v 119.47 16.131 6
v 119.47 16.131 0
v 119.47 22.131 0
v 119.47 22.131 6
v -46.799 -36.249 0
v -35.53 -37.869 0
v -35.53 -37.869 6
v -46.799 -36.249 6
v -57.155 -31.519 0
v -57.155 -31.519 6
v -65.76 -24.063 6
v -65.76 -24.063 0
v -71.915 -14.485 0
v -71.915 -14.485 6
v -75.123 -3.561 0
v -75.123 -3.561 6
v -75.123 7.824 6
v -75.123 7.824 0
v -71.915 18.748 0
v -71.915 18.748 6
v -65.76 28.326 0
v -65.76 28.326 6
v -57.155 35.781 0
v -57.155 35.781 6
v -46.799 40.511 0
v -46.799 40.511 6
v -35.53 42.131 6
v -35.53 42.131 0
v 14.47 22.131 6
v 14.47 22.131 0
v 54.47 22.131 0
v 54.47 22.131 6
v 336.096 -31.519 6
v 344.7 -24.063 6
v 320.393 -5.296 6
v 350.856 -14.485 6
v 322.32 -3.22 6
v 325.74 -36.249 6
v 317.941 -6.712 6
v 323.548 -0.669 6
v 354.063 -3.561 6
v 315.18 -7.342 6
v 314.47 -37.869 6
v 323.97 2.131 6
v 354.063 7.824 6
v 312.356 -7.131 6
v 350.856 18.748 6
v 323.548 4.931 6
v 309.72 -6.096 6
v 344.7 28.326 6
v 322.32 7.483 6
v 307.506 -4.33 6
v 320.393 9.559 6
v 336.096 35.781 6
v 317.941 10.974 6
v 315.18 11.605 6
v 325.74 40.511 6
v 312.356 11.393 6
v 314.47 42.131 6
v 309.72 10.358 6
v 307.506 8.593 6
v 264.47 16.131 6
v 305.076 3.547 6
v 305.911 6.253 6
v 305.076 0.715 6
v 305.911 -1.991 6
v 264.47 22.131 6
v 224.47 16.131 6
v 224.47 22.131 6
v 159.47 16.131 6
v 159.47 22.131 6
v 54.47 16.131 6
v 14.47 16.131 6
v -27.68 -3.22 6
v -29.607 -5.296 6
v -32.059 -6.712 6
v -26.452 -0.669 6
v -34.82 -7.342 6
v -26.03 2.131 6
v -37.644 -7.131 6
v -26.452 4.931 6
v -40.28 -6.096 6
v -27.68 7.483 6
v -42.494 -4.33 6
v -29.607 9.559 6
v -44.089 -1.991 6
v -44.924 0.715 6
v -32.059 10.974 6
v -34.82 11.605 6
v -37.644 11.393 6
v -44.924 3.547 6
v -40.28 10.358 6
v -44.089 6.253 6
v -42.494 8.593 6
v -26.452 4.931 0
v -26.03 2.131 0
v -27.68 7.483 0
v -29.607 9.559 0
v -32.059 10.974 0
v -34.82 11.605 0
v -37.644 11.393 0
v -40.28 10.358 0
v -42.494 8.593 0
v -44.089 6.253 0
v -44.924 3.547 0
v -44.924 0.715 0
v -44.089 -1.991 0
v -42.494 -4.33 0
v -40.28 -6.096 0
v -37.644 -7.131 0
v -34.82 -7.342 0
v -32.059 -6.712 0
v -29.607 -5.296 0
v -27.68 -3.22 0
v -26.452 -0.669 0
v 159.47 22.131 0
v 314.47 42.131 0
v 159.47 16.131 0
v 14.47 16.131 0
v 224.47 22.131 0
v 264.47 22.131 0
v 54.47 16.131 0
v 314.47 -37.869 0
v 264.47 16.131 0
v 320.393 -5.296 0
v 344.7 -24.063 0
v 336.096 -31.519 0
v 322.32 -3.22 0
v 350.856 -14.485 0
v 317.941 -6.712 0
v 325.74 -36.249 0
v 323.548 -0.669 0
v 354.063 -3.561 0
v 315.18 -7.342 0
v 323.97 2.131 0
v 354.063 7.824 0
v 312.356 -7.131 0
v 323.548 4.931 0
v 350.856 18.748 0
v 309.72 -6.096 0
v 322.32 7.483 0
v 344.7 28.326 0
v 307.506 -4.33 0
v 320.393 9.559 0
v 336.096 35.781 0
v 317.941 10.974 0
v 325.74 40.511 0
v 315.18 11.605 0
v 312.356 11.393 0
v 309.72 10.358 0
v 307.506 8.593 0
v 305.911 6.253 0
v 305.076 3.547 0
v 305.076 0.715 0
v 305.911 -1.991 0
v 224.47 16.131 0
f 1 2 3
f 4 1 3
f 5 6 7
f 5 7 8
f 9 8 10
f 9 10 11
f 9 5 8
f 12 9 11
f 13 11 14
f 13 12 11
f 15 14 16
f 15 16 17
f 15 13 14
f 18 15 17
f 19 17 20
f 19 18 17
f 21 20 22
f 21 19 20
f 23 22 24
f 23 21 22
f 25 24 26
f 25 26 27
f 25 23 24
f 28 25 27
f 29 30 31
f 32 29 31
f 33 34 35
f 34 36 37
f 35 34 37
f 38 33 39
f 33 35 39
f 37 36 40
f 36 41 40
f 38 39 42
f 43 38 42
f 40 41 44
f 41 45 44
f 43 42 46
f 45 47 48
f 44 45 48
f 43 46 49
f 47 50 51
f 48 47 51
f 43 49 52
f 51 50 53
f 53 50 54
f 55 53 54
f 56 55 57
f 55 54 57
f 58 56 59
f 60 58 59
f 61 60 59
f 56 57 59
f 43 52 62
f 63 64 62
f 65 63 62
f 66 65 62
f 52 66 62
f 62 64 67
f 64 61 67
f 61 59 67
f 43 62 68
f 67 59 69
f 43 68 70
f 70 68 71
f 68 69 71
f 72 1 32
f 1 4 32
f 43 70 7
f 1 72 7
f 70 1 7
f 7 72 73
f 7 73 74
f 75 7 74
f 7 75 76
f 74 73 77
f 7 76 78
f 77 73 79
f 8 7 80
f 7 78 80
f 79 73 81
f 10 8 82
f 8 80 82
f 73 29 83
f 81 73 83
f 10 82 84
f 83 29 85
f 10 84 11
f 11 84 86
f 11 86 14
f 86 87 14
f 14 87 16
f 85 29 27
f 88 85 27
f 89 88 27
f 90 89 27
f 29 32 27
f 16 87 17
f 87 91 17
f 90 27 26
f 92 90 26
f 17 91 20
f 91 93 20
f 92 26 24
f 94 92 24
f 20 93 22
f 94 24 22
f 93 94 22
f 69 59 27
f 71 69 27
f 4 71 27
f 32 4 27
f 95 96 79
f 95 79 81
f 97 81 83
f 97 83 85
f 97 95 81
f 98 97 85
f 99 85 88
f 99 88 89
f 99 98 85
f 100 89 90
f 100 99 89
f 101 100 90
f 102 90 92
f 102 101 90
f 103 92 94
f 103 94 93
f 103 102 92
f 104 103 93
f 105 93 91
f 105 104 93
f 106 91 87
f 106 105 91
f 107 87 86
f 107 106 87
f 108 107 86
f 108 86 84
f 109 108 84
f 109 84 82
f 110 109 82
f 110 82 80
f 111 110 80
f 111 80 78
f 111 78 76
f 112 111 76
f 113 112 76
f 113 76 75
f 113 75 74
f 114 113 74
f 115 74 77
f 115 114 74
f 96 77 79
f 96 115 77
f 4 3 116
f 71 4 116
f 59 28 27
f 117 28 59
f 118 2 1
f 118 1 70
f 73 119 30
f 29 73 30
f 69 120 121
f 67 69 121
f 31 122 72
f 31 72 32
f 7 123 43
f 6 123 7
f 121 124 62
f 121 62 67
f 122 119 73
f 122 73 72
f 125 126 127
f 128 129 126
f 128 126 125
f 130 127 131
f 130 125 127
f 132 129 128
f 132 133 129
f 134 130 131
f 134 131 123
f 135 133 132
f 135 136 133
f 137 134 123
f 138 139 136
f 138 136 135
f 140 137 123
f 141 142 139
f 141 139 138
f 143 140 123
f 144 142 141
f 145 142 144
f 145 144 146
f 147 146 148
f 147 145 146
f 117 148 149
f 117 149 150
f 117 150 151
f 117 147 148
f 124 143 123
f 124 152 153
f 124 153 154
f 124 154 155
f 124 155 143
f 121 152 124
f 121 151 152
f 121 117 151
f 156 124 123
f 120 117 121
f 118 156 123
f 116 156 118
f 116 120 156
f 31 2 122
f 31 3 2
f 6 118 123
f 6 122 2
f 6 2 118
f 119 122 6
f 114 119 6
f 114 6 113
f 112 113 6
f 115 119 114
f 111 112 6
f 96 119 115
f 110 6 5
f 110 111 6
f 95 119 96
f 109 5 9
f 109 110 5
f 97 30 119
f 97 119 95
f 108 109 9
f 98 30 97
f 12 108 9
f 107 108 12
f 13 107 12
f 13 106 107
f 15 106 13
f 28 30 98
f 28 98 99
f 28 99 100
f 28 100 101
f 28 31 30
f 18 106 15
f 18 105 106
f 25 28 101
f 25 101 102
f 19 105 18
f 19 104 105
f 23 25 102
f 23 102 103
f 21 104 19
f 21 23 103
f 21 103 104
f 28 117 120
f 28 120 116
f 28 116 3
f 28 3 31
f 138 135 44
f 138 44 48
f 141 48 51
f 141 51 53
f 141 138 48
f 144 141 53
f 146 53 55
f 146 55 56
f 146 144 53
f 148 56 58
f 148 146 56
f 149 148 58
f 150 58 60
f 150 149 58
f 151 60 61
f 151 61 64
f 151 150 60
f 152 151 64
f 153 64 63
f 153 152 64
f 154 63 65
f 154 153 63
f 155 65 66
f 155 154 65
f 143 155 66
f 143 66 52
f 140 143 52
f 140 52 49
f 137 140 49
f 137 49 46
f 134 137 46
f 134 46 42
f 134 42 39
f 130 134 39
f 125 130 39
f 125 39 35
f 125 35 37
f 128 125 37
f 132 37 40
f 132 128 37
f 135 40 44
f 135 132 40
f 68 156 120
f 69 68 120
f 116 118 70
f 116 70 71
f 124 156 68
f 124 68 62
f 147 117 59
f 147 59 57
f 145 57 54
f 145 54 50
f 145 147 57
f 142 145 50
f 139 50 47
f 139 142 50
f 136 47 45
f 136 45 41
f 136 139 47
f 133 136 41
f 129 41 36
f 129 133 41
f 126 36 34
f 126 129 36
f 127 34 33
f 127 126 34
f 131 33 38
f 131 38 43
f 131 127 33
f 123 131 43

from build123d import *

# Parameters (mm, degrees)
SKETCH1_R           = 9.5
SKETCH1_W           = 40
SKETCH1_H           = 6
BOSS_EXTRUDE1_DEPTH = 6


with BuildPart() as part:
    # Sketch1 → Boss-Extrude1 (new body)
    with BuildSketch(Plane.XY):
        with BuildLine():
            Line((-35.529687849, 42.131147541), (314.470312151, 42.131147541))
            ThreePointArc((314.470312151, 42.131147541), (354.470312151, 2.131147541), (314.470312151, -37.868852459))
            Line((314.470312151, -37.868852459), (-35.529687849, -37.868852459))
            ThreePointArc((-35.529687849, -37.868852459), (-75.529687849, 2.131147541), (-35.529687849, 42.131147541))
        make_face()
        with Locations((-35.529687849, 2.131147541)):
            Circle(SKETCH1_R, mode=Mode.SUBTRACT)
        with Locations((314.470312151, 2.131147541)):
            Circle(SKETCH1_R, mode=Mode.SUBTRACT)
        with Locations((139.470312151, 19.131147541)):
            Rectangle(SKETCH1_W, SKETCH1_H, mode=Mode.SUBTRACT)
        with Locations((244.470312151, 19.131147541)):
            Rectangle(SKETCH1_W, SKETCH1_H, mode=Mode.SUBTRACT)
        with Locations((34.470312151, 19.131147541)):
            Rectangle(SKETCH1_W, SKETCH1_H, mode=Mode.SUBTRACT)
    extrude(amount=BOSS_EXTRUDE1_DEPTH)


solid = part.part
